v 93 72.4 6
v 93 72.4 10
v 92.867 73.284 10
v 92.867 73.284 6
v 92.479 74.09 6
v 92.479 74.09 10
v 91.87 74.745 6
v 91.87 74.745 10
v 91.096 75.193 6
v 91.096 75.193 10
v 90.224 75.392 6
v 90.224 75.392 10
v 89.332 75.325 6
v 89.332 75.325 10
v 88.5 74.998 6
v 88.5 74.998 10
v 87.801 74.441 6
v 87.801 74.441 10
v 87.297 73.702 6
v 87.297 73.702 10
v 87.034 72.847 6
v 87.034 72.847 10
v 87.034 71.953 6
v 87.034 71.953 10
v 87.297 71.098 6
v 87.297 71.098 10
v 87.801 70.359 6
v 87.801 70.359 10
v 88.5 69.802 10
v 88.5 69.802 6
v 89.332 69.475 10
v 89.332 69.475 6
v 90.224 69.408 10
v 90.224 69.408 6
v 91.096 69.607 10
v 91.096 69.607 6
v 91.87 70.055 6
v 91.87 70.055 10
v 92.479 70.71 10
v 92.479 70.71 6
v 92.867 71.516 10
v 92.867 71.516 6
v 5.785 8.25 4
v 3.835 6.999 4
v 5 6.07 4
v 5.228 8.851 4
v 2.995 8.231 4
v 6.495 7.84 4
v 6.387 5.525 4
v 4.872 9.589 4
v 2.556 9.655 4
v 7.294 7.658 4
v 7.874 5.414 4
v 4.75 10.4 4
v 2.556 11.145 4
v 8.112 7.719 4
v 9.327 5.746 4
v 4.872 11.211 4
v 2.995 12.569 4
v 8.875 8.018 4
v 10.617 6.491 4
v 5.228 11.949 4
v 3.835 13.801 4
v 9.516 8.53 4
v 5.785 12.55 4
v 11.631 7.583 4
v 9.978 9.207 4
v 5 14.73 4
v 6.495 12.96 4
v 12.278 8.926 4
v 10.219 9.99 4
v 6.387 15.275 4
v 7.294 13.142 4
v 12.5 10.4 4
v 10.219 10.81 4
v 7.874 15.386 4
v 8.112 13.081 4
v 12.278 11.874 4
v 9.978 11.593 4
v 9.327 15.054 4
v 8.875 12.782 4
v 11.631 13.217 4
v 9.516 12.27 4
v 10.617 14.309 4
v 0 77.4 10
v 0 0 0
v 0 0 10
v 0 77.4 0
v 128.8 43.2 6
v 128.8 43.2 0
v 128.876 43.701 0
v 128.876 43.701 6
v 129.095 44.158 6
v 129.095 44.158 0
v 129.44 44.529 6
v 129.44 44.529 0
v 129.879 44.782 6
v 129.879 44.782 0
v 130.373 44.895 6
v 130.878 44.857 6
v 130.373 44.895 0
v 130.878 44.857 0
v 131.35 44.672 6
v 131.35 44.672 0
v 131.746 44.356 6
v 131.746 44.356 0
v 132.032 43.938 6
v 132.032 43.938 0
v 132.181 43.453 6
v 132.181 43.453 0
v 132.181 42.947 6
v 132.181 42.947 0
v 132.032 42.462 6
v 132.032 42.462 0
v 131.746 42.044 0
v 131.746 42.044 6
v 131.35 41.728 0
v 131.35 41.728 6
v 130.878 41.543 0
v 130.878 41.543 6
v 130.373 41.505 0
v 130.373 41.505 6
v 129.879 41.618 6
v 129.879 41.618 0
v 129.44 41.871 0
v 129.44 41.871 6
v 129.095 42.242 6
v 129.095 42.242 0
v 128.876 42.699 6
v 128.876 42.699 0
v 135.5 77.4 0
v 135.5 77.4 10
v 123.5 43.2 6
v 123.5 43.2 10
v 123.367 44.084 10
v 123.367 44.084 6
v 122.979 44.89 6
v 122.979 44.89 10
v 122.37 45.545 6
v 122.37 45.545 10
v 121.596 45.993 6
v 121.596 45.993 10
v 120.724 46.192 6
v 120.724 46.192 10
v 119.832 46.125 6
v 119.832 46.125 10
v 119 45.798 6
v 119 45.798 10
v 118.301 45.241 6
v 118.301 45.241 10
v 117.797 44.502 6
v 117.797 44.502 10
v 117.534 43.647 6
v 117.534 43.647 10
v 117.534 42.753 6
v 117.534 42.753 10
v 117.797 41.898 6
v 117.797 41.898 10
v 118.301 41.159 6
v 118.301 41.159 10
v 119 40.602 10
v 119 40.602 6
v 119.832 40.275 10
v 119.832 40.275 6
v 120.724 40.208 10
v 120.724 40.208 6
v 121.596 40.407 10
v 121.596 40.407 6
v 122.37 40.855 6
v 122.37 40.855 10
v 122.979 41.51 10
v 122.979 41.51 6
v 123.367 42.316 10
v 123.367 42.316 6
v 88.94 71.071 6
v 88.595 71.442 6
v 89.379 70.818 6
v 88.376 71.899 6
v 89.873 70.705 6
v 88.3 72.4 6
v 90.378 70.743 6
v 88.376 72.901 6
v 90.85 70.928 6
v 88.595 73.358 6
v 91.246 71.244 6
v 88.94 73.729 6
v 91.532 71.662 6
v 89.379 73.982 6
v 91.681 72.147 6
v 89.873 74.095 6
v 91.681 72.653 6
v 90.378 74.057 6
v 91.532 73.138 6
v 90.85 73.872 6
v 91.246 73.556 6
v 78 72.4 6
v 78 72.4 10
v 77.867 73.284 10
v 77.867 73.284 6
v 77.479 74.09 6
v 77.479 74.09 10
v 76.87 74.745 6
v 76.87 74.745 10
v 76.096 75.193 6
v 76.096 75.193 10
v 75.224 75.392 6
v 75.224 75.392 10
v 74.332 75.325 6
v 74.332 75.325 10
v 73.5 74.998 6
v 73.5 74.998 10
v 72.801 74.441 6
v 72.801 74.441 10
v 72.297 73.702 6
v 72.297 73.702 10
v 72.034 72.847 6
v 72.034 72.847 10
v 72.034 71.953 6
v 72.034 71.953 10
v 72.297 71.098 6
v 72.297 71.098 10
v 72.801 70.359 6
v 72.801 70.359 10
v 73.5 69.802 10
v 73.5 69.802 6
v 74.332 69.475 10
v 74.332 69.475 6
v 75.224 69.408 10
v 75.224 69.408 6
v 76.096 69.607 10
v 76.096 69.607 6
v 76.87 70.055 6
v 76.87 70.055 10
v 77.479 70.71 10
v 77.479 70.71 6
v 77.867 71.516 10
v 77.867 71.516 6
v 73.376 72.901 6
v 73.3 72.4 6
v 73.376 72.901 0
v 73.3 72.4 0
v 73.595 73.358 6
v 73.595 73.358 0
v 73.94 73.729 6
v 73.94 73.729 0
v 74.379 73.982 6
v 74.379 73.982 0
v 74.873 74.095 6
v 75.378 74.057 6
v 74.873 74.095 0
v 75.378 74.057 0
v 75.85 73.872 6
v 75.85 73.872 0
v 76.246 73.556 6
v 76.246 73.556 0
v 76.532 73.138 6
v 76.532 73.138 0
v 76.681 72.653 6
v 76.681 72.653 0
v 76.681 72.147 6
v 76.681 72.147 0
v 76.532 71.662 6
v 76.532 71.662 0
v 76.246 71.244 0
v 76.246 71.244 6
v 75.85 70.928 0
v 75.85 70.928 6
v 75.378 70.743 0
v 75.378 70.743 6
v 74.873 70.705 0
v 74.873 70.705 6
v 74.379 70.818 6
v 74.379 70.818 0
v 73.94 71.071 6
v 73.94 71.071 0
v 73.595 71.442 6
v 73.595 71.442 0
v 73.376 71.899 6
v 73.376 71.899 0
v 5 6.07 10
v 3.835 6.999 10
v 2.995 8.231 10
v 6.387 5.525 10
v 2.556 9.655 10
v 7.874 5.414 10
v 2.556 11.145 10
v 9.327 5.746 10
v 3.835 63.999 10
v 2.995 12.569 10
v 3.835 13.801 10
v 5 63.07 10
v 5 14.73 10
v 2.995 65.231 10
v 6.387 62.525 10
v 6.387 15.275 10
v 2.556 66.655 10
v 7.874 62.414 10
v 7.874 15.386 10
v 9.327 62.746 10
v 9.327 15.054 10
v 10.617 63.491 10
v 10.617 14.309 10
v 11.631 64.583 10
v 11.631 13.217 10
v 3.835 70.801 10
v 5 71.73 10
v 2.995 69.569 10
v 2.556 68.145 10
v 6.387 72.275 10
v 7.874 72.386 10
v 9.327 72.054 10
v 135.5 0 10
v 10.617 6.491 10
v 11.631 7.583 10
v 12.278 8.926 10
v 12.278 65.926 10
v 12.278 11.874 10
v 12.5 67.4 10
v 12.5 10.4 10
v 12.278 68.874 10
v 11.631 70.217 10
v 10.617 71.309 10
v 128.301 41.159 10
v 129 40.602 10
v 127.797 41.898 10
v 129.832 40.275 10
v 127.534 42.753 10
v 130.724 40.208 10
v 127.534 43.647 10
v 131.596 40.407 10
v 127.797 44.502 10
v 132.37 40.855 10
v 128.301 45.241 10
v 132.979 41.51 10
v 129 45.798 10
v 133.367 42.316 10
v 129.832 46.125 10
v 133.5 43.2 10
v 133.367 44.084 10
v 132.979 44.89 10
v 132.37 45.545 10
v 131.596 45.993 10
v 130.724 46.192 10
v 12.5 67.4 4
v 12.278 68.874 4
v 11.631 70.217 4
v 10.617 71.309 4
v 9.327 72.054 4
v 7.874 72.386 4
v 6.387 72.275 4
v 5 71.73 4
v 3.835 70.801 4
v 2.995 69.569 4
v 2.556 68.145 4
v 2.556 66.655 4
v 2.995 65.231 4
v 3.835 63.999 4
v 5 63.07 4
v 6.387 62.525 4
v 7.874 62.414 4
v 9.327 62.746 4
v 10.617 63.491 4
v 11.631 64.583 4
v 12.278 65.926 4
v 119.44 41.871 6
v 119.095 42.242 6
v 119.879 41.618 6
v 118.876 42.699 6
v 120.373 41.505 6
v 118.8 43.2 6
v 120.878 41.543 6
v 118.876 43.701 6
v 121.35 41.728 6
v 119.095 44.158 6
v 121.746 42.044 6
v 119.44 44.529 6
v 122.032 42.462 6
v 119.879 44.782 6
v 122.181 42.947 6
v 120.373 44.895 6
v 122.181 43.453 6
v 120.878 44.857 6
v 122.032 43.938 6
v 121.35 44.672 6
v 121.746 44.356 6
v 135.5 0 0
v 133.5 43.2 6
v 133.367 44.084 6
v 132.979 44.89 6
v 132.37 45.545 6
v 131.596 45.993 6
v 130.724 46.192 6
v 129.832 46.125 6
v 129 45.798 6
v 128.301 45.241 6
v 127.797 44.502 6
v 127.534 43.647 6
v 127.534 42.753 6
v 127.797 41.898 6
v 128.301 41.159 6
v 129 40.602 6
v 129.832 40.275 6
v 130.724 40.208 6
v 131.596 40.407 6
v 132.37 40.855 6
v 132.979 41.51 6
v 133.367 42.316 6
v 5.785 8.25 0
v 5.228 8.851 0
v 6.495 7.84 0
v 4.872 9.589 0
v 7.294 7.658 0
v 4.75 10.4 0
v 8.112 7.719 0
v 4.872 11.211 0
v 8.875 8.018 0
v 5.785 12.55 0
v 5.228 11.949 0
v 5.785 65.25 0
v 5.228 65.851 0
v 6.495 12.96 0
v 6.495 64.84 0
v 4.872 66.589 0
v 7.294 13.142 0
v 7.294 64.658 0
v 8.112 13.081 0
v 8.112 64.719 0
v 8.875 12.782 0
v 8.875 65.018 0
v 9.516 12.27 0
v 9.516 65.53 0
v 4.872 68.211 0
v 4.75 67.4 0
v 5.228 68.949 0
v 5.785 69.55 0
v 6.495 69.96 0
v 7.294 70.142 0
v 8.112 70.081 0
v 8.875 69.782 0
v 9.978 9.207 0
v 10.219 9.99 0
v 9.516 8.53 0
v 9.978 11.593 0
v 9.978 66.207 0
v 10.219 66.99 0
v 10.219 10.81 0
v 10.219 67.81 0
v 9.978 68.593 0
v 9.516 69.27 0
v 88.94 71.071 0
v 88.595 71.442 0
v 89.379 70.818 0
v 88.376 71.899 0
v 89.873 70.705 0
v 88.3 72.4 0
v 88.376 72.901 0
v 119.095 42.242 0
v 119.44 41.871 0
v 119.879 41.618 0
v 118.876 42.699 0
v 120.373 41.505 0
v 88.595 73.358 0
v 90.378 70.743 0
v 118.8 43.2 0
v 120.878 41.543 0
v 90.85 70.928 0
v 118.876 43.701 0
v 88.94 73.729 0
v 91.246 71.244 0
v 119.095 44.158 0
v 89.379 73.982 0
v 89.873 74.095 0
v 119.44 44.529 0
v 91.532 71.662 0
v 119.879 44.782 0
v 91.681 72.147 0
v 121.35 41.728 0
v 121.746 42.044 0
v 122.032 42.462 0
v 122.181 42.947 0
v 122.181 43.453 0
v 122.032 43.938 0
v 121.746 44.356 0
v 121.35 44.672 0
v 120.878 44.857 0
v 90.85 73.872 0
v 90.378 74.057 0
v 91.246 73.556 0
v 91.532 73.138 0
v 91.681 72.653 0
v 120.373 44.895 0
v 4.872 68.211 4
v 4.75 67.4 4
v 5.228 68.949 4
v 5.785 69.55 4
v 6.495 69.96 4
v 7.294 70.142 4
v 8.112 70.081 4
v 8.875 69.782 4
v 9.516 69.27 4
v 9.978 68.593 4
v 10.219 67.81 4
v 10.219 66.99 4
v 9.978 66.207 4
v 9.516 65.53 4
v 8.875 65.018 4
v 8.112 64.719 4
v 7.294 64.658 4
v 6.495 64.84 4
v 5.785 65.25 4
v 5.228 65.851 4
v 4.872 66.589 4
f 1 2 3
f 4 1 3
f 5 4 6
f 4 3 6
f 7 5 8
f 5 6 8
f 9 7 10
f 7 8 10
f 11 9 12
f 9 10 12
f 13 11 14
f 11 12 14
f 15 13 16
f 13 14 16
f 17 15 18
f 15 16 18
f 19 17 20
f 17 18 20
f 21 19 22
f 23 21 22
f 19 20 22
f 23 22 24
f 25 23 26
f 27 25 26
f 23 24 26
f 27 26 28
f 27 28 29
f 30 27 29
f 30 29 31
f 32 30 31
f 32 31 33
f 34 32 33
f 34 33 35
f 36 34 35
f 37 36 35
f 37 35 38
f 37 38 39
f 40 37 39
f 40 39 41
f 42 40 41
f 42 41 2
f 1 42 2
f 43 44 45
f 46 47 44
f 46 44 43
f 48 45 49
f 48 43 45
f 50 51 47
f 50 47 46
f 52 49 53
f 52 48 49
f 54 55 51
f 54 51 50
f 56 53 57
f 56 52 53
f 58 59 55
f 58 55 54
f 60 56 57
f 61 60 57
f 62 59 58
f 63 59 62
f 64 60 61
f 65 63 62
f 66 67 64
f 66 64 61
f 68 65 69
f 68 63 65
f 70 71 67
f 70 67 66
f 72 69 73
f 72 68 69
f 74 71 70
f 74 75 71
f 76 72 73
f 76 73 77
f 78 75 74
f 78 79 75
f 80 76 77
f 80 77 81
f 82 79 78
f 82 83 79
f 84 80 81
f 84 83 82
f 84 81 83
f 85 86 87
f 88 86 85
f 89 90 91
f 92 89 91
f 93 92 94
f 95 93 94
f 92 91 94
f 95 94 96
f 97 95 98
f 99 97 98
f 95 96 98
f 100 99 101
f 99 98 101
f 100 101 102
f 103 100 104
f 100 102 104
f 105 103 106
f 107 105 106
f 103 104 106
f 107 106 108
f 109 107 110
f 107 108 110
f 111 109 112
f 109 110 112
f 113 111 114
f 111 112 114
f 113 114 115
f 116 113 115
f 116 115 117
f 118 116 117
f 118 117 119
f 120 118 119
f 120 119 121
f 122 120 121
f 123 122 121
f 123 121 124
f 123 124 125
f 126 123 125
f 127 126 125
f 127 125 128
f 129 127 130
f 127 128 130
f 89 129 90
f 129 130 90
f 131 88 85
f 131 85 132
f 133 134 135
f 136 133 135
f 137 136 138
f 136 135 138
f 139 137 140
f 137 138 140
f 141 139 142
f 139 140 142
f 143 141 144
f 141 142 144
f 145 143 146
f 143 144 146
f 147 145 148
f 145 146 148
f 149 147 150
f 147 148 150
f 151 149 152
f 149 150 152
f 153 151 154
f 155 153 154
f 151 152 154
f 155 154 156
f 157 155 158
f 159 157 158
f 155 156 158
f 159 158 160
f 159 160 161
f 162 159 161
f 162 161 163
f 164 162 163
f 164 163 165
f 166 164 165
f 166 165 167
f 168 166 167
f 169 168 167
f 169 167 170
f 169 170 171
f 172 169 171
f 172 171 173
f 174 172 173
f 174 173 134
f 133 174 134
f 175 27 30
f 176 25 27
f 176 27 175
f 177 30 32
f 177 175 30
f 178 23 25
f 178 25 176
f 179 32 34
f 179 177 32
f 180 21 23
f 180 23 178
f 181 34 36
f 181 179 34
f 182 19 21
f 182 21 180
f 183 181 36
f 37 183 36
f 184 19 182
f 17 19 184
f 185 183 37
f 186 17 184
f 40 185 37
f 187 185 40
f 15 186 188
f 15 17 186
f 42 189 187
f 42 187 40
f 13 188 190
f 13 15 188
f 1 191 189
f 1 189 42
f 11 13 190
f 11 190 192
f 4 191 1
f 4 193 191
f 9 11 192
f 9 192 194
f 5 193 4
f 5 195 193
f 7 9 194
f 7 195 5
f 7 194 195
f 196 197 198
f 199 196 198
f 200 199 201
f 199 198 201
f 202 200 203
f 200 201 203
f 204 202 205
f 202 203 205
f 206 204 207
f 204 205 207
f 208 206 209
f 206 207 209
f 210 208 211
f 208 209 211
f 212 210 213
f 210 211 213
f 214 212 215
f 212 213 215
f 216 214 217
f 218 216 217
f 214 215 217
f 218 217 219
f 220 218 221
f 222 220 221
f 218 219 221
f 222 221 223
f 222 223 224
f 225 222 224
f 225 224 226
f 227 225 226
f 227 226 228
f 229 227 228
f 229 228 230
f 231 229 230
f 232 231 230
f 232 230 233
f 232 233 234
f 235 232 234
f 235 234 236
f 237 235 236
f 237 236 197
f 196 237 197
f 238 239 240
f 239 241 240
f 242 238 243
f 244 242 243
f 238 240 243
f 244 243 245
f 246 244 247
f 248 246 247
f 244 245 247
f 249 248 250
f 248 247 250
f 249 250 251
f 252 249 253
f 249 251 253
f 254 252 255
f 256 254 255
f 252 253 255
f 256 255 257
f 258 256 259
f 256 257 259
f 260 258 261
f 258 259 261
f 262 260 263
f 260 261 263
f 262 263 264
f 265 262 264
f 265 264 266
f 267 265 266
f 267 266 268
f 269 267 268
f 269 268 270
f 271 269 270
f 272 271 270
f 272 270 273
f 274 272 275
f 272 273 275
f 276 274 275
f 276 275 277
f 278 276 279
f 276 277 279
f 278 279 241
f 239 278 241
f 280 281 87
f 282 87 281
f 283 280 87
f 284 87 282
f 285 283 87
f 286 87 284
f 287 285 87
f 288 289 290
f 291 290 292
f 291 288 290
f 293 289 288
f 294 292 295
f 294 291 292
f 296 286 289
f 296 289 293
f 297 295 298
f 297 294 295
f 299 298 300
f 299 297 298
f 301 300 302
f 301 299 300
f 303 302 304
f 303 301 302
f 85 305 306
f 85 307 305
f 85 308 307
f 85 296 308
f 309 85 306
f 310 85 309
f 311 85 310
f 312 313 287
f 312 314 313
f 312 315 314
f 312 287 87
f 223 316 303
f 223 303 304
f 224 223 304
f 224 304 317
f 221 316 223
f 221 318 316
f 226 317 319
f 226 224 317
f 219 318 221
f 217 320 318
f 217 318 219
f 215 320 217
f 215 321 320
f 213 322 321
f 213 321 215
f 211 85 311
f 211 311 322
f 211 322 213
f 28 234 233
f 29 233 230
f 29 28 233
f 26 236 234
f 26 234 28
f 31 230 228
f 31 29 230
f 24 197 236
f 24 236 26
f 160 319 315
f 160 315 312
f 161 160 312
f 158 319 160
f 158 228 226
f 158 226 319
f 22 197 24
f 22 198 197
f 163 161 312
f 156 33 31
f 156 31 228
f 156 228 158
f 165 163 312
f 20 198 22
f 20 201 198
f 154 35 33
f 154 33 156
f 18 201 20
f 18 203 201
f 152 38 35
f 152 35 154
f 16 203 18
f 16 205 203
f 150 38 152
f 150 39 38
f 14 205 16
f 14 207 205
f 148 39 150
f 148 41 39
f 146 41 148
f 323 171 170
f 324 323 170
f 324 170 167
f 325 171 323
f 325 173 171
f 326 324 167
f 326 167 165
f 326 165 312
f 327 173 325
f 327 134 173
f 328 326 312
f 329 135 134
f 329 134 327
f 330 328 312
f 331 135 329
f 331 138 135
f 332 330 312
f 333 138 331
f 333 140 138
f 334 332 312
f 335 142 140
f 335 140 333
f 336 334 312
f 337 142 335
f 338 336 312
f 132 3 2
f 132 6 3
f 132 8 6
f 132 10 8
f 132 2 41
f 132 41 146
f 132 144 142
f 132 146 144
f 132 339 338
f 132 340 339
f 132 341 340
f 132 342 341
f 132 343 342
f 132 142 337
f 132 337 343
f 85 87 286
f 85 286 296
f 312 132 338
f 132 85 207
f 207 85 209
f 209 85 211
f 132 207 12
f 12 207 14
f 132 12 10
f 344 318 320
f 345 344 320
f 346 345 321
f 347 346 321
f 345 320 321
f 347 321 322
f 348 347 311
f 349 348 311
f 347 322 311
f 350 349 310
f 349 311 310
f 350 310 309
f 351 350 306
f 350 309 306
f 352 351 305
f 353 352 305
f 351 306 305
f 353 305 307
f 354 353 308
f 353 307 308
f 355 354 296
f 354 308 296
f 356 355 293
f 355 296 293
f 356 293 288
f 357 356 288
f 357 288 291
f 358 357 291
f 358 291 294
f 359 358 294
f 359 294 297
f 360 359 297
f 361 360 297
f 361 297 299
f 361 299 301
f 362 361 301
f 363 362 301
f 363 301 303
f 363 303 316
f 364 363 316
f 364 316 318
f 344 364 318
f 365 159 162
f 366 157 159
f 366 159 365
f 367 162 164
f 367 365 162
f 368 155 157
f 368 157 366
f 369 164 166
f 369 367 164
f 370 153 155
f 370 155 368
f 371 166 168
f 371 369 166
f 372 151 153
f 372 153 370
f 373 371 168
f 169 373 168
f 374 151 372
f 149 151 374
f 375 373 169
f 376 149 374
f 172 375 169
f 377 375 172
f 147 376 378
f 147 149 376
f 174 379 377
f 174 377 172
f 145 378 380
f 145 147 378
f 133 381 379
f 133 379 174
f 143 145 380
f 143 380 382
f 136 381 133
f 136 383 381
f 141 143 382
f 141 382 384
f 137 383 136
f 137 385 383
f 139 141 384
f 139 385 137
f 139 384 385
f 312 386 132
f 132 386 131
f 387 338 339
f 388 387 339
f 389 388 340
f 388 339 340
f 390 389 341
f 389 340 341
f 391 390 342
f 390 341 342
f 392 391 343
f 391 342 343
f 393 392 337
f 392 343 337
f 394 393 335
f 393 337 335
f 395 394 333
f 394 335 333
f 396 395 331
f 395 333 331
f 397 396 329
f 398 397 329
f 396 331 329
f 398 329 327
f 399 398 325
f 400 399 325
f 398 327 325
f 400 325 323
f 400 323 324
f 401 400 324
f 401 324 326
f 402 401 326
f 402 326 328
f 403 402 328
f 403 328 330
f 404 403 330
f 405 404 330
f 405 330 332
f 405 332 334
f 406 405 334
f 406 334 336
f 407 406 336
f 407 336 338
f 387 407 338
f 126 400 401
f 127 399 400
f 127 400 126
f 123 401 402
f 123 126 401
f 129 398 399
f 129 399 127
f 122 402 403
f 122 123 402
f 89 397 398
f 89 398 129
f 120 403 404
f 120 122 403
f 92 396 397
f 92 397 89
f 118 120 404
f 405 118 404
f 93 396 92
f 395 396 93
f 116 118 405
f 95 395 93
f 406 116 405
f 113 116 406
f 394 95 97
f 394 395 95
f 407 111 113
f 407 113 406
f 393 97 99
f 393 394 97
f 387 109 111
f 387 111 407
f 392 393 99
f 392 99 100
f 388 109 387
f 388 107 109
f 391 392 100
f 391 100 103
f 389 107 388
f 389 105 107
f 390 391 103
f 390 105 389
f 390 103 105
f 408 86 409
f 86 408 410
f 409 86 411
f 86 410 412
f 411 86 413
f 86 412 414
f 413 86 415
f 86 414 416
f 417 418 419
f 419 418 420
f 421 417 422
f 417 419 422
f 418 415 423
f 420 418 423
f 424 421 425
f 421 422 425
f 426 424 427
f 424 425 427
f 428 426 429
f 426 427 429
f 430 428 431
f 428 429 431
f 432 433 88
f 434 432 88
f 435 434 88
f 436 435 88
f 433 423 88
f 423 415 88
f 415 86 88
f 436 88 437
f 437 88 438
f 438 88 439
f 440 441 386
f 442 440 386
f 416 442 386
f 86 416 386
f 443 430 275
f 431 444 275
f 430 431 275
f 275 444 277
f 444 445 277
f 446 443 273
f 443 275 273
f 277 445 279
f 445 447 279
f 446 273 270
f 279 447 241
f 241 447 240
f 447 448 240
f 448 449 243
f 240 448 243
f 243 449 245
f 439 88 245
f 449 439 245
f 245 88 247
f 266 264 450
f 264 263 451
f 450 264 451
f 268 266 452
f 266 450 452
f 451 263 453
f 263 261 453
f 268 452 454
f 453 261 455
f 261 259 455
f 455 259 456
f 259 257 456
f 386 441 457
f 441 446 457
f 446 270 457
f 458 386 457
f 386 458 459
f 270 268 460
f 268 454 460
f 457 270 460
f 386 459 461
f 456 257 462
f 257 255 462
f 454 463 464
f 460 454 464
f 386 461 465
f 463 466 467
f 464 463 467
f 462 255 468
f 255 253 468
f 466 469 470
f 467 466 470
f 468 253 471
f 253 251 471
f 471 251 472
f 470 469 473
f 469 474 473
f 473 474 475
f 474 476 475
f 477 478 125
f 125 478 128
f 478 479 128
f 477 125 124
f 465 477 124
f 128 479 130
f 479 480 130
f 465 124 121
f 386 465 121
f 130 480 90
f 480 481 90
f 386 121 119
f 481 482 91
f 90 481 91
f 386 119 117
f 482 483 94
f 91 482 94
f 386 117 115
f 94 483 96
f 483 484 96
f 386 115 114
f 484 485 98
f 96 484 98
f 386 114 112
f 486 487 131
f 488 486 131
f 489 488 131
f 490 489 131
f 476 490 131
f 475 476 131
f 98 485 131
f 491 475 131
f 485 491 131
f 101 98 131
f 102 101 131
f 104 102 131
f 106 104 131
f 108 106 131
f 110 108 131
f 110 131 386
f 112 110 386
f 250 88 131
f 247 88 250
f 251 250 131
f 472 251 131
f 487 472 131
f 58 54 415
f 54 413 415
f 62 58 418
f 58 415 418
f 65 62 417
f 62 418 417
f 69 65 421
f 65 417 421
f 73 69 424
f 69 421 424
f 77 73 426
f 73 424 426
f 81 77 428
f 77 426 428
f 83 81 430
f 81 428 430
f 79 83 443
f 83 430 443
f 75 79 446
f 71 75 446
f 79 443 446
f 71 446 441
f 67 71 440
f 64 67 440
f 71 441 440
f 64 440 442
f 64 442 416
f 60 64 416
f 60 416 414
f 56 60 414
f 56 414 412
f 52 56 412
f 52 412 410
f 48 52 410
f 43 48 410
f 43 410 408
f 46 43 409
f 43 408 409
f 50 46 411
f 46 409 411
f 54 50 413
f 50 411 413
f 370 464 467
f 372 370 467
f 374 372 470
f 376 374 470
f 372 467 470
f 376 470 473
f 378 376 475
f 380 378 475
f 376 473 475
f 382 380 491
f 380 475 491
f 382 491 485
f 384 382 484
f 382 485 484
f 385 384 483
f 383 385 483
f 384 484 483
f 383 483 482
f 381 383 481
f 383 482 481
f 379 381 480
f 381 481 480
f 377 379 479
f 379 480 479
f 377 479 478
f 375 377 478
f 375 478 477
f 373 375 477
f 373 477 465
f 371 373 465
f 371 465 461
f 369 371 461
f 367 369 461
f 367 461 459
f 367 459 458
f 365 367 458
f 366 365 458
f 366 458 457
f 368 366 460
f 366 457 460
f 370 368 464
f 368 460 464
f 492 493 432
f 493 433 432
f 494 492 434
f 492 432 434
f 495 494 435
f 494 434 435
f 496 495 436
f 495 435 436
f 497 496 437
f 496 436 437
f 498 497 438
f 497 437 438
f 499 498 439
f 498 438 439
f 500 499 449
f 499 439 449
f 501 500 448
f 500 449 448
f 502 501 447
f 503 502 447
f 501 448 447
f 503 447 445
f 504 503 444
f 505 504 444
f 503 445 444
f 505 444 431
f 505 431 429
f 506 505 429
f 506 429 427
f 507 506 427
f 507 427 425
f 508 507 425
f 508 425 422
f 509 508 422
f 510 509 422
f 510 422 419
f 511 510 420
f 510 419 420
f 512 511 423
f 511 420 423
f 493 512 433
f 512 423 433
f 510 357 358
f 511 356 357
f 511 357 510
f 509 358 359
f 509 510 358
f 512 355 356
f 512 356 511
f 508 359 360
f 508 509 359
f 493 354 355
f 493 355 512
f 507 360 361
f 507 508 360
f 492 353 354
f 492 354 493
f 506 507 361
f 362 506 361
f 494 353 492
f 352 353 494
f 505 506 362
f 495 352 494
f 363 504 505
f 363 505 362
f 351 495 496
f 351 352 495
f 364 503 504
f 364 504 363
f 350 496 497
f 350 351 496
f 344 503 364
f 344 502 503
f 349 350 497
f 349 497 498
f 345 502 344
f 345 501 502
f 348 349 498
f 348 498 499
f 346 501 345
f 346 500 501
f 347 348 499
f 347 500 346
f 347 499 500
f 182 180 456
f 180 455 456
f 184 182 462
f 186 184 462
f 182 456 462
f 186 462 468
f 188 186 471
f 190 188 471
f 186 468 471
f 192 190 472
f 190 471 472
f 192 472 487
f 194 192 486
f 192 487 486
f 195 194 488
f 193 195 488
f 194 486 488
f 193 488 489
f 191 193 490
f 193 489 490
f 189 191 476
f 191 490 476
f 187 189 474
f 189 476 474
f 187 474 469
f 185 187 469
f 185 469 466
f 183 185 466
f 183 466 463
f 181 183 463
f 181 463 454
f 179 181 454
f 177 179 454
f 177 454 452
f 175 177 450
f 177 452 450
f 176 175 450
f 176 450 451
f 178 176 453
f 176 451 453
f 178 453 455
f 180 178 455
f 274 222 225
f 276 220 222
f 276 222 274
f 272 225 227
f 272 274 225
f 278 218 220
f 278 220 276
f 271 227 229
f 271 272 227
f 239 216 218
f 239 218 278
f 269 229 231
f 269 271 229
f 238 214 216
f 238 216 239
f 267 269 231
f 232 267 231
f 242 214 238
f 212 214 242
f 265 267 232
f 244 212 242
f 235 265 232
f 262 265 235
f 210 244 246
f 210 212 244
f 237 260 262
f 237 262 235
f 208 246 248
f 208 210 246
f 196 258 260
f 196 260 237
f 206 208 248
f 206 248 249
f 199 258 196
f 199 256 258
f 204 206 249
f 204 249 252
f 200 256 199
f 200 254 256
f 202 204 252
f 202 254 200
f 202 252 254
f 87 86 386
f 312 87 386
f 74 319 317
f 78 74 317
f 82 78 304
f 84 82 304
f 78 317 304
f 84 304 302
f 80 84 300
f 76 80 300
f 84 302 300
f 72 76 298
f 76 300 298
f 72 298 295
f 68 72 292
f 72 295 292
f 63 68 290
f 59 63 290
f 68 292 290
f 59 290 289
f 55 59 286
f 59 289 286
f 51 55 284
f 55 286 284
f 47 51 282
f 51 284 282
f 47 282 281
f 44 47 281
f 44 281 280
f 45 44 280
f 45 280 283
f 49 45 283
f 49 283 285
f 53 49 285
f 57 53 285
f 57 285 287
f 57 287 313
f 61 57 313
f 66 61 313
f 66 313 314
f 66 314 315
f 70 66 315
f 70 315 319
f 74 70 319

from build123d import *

# Parameters (mm, degrees)
SKETCH_1_W                   = 135.5
SKETCH_1_H                   = 77.4
EXTRUDE_1_DEPTH              = 10
HOLE_WIZARD_M3_1_D           = 3.4
HOLE_WIZARD_M3_1_CBORE_D     = 6
HOLE_WIZARD_M3_1_CBORE_DEPTH = 4
HOLE_WIZARD_M3_2_D           = 3.4
HOLE_WIZARD_M3_2_CBORE_D     = 6
HOLE_WIZARD_M3_2_CBORE_DEPTH = 4
HOLE_WIZARD_M5_1_D           = 5.5
HOLE_WIZARD_M5_1_CBORE_D     = 10
HOLE_WIZARD_M5_1_CBORE_DEPTH = 6


with BuildPart() as part:
    # ｽｹｯﾁ1 → ﾎﾞｽ - 押し出し1 (new body)
    with BuildSketch(Plane.XY):
        with Locations((67.75, 38.7)):
            Rectangle(SKETCH_1_W, SKETCH_1_H)
    extrude(amount=EXTRUDE_1_DEPTH)

    # M3 穴付きねじ用座ぐり穴1 (through all)
    with Locations(Plane.XY.offset(10)):
        with Locations((130.5, 43.2), (120.5, 43.2)):
            CounterBoreHole(HOLE_WIZARD_M3_1_D / 2, HOLE_WIZARD_M3_1_CBORE_D / 2, HOLE_WIZARD_M3_1_CBORE_DEPTH)

    # M3 穴付きねじ用座ぐり穴2 (through all)
    with Locations(Plane.XY.offset(10)):
        with Locations((130.5, 43.2), (75, 72.4), (90, 72.4), (120.5, 43.2)):
            CounterBoreHole(HOLE_WIZARD_M3_2_D / 2, HOLE_WIZARD_M3_2_CBORE_D / 2, HOLE_WIZARD_M3_2_CBORE_DEPTH)

    # M5 穴付きねじ用座ぐり穴1 (through all)
    with Locations(Plane.XY.offset(10)):
        with Locations((7.5, 67.4), (7.5, 10.4)):
            CounterBoreHole(HOLE_WIZARD_M5_1_D / 2, HOLE_WIZARD_M5_1_CBORE_D / 2, HOLE_WIZARD_M5_1_CBORE_DEPTH)


solid = part.part
